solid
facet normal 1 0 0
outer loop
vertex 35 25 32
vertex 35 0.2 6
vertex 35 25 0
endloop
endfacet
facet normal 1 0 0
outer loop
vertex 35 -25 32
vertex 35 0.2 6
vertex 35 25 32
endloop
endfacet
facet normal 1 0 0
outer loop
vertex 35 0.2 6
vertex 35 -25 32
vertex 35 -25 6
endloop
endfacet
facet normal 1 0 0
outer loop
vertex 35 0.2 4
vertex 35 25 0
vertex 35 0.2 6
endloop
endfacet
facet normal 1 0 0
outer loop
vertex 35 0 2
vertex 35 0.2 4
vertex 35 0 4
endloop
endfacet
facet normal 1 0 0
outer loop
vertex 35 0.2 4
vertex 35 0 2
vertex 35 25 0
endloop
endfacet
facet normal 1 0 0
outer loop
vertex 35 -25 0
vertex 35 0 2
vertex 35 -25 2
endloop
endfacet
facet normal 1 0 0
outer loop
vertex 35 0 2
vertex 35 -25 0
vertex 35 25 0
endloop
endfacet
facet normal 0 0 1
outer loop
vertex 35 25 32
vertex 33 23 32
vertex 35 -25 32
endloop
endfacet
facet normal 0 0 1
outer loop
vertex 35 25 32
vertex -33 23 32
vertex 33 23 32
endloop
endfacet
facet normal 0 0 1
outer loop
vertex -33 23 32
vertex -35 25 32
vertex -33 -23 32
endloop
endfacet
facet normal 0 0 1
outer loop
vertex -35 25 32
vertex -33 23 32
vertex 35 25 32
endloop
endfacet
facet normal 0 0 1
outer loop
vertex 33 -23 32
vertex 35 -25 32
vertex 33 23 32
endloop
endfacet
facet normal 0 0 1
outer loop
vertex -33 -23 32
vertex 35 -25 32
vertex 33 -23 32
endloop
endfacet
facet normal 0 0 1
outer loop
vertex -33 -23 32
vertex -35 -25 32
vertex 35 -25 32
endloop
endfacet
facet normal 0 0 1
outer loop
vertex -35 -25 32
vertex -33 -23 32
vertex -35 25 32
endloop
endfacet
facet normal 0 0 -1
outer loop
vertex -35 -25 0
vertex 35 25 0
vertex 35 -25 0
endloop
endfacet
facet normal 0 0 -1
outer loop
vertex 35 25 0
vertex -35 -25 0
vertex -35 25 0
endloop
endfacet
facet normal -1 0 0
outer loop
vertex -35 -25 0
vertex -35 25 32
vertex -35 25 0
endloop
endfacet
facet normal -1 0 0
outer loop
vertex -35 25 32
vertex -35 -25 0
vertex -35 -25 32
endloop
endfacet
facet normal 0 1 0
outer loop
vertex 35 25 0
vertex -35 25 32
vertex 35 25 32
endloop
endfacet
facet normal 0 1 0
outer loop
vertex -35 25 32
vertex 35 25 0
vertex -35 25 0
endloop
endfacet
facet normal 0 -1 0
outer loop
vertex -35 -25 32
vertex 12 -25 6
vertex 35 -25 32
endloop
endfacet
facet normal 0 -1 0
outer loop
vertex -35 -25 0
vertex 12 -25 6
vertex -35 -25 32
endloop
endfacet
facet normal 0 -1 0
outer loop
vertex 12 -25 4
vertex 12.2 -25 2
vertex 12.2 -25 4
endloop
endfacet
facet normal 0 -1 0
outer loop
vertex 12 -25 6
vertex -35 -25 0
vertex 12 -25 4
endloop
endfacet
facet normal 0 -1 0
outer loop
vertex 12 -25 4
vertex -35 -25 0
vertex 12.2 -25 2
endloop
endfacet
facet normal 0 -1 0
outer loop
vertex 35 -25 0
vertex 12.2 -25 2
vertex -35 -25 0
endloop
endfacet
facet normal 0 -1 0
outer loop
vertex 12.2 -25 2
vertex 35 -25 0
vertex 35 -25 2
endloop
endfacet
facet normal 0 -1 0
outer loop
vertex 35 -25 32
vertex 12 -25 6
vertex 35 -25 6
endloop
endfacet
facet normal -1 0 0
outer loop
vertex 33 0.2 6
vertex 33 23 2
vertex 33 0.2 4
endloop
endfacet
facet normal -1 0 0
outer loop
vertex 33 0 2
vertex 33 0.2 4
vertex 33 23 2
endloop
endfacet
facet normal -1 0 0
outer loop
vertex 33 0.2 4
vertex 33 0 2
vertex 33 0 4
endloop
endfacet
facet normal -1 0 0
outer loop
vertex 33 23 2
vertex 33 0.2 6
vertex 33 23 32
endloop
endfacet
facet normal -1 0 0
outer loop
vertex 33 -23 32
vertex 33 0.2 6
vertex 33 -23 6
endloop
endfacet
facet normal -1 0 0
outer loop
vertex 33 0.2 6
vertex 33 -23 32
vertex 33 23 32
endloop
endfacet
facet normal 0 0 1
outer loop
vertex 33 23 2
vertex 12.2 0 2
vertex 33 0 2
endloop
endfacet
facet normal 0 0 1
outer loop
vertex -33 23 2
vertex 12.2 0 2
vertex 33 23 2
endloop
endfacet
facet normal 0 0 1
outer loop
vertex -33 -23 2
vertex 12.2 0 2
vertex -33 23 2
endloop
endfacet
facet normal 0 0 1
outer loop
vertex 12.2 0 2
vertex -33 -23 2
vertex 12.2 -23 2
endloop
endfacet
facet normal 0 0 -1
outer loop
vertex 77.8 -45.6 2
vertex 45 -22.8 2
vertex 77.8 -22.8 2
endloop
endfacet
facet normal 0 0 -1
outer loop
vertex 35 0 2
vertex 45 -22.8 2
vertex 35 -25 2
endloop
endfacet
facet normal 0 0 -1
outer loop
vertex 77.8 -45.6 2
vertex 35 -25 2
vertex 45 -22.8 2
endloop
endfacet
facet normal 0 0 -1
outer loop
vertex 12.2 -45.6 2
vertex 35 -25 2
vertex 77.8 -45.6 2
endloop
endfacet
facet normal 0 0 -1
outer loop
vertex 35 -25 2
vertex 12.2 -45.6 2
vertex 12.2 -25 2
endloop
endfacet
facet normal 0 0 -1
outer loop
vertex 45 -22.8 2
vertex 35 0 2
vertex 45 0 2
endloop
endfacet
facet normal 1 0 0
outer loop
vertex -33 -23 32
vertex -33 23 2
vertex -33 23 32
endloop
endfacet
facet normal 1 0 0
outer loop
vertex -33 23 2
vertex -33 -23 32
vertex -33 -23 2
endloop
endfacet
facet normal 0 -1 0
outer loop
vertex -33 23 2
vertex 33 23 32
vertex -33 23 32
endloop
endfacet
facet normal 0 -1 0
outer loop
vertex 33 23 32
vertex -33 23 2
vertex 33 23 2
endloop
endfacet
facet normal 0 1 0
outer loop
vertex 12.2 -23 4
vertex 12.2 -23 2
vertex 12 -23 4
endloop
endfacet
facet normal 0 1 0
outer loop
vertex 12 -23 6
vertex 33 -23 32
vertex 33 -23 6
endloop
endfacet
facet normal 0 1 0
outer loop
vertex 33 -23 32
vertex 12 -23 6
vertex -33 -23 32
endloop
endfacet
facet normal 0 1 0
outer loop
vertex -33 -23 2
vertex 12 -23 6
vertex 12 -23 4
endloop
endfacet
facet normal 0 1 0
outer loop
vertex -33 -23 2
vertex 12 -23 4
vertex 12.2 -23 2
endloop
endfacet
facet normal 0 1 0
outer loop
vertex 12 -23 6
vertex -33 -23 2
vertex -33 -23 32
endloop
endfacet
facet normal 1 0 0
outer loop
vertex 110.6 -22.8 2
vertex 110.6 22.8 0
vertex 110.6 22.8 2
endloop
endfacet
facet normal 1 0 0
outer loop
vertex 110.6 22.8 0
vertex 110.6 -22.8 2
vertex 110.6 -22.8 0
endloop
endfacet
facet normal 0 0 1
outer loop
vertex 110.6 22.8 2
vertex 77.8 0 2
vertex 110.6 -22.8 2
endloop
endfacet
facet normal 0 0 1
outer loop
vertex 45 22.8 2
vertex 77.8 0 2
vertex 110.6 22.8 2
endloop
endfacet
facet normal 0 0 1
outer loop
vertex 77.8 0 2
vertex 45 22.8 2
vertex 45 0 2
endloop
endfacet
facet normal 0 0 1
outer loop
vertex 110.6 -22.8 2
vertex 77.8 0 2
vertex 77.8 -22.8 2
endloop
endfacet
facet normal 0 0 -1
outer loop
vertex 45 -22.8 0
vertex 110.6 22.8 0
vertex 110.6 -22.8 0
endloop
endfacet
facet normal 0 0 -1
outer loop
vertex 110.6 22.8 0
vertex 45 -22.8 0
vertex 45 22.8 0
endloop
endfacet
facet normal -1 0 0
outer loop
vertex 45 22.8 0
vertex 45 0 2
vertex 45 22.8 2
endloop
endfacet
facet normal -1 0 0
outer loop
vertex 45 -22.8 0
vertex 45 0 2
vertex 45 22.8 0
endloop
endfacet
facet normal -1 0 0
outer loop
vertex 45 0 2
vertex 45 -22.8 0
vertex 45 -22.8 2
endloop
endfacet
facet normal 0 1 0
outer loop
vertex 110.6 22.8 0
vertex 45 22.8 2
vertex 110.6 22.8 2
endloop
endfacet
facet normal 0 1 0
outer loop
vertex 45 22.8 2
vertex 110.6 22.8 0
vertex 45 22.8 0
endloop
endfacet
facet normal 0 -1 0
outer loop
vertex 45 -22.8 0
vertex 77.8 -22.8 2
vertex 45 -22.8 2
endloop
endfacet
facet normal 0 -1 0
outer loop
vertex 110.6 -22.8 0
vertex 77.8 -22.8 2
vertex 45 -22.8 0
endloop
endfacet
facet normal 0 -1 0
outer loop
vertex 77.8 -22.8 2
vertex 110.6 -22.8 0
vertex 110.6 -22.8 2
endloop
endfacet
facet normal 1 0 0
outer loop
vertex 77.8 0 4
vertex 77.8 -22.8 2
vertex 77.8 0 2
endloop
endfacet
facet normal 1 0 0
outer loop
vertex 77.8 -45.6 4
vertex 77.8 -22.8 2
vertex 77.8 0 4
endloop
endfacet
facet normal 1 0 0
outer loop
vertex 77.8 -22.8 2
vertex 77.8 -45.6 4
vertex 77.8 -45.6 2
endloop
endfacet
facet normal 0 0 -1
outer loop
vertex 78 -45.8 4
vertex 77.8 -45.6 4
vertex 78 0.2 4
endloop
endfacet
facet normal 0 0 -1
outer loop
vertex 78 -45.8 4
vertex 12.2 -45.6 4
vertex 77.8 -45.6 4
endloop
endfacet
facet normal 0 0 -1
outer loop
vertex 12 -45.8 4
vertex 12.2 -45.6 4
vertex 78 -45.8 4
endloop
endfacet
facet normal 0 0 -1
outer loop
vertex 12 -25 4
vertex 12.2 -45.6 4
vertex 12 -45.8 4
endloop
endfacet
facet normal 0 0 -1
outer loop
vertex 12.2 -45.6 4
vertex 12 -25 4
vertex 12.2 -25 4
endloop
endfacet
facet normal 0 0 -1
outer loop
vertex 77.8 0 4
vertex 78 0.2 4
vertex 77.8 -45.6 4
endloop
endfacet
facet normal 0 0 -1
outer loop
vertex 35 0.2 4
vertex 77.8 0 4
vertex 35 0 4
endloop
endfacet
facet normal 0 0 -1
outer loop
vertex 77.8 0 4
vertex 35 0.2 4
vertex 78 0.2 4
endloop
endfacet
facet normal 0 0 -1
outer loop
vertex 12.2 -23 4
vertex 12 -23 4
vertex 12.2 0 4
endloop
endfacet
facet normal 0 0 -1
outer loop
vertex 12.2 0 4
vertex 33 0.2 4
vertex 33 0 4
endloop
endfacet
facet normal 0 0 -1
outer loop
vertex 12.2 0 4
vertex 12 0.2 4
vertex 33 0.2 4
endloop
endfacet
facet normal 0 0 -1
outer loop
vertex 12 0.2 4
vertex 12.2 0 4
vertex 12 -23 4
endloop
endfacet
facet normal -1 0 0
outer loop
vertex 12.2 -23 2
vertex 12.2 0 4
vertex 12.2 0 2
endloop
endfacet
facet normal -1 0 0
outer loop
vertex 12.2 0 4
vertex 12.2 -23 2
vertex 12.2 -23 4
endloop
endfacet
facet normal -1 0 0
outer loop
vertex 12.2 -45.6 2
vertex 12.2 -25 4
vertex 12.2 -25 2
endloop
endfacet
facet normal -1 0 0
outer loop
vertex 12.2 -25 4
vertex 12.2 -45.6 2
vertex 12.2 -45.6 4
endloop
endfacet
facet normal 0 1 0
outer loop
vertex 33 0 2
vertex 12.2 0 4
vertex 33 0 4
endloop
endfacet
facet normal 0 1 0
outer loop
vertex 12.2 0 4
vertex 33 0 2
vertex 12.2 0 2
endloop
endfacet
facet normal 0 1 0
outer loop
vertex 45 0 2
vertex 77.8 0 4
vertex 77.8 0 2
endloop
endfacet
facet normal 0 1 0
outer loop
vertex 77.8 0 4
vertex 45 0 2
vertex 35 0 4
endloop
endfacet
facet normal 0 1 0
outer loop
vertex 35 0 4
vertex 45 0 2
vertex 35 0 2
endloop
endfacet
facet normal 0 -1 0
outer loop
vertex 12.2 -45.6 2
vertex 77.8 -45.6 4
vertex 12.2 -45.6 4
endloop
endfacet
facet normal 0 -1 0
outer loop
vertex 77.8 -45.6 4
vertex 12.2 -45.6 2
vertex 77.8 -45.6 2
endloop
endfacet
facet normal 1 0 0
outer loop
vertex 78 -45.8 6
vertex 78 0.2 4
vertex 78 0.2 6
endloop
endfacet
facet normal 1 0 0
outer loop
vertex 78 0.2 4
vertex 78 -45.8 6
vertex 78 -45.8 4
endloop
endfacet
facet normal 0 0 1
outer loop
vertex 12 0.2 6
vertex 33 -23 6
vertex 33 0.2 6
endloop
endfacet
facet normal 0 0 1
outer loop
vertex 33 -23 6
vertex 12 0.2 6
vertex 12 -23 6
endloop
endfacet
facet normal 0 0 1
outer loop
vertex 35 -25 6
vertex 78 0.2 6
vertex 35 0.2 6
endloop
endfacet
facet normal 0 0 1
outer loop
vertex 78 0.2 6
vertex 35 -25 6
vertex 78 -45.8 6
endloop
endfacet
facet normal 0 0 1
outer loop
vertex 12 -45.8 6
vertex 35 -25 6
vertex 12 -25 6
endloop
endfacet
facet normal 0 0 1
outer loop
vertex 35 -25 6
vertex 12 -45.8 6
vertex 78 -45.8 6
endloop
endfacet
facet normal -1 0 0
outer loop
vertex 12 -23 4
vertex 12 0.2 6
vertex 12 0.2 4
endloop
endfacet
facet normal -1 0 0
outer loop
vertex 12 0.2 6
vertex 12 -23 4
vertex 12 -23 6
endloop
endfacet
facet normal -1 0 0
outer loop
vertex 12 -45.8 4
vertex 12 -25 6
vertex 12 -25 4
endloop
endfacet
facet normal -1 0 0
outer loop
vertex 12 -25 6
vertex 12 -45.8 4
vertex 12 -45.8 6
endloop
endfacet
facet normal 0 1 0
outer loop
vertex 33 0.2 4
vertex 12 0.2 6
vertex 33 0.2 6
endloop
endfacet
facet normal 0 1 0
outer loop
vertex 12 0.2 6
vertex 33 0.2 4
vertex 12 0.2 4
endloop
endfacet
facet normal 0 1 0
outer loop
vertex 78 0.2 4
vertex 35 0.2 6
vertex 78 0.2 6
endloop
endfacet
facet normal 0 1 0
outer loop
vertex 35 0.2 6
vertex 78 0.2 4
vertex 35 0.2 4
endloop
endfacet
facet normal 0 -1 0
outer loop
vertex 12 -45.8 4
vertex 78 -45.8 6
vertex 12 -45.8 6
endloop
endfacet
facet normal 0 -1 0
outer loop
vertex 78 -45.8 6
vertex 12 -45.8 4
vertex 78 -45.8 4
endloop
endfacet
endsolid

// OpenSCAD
// Two-part enclosure for a small electronics board (e.g. Arduino-based temperature logger)
// Prints together: box on the left, lid (upside down) on the right, with a 10 mm gap.
// Units: mm. Wall thicknesses are 2 mm unless noted otherwise.

// ---------------- Parameters ----------------
box_x      = 70;    // box outer length (X)
box_y      = 50;    // box outer width (Y)
box_z      = 30;    // box height (Z)
wall       = 2;     // box wall thickness
floor      = 2;     // box floor thickness

lip_t      = 1.5;   // lid lip wall thickness
lip_h      = 4;     // lid lip height
lip_x      = 65.6;  // lid lip outer length (X)
lip_y      = 45.6;  // lid lip outer width (Y)

clearance  = 0.2;   // side clearance between lip and box opening
gap        = 10;    // gap between box and lid on the bed
eps        = 0.5;   // overshoot for clean boolean cuts

$fn = 64;

// Derived: lid plate thickness = lip height - wall thickness
plate_t = lip_h - wall;   // 2 mm plate

// ---------------- Model ----------------
union() {
    // Part 1: Box (open top)
    difference() {
        translate([-box_x/2, -box_y/2, 0])
            cube([box_x, box_y, box_z + floor]);
        translate([-box_x/2 + wall, -box_y/2 + wall, floor])
            cube([box_x - 2*wall, box_y - 2*wall, box_z + 0.01]); // open-top cavity
    }

    // Part 2: Lid (printed upside down: plate on bed, lip pointing up)
    translate([box_x/2 + gap, -lip_y/2, 0])
        union() {
            // Base plate
            translate([0, 0, 0])
                cube([lip_x, lip_y, plate_t]);

            // Rectangular lip, centred on the plate
            translate([-lip_x/2, -lip_y/2, plate_t])
                cube([lip_x, lip_y, wall]);

            // Lip overhangs (4 mm tall, extends past the cavity with clearance)
            translate([-lip_x/2 - clearance, -lip_y/2 - clearance, plate_t + wall])
                cube([lip_x + 2*clearance, lip_y + 2*clearance, lip_h - wall]);
        }
}
